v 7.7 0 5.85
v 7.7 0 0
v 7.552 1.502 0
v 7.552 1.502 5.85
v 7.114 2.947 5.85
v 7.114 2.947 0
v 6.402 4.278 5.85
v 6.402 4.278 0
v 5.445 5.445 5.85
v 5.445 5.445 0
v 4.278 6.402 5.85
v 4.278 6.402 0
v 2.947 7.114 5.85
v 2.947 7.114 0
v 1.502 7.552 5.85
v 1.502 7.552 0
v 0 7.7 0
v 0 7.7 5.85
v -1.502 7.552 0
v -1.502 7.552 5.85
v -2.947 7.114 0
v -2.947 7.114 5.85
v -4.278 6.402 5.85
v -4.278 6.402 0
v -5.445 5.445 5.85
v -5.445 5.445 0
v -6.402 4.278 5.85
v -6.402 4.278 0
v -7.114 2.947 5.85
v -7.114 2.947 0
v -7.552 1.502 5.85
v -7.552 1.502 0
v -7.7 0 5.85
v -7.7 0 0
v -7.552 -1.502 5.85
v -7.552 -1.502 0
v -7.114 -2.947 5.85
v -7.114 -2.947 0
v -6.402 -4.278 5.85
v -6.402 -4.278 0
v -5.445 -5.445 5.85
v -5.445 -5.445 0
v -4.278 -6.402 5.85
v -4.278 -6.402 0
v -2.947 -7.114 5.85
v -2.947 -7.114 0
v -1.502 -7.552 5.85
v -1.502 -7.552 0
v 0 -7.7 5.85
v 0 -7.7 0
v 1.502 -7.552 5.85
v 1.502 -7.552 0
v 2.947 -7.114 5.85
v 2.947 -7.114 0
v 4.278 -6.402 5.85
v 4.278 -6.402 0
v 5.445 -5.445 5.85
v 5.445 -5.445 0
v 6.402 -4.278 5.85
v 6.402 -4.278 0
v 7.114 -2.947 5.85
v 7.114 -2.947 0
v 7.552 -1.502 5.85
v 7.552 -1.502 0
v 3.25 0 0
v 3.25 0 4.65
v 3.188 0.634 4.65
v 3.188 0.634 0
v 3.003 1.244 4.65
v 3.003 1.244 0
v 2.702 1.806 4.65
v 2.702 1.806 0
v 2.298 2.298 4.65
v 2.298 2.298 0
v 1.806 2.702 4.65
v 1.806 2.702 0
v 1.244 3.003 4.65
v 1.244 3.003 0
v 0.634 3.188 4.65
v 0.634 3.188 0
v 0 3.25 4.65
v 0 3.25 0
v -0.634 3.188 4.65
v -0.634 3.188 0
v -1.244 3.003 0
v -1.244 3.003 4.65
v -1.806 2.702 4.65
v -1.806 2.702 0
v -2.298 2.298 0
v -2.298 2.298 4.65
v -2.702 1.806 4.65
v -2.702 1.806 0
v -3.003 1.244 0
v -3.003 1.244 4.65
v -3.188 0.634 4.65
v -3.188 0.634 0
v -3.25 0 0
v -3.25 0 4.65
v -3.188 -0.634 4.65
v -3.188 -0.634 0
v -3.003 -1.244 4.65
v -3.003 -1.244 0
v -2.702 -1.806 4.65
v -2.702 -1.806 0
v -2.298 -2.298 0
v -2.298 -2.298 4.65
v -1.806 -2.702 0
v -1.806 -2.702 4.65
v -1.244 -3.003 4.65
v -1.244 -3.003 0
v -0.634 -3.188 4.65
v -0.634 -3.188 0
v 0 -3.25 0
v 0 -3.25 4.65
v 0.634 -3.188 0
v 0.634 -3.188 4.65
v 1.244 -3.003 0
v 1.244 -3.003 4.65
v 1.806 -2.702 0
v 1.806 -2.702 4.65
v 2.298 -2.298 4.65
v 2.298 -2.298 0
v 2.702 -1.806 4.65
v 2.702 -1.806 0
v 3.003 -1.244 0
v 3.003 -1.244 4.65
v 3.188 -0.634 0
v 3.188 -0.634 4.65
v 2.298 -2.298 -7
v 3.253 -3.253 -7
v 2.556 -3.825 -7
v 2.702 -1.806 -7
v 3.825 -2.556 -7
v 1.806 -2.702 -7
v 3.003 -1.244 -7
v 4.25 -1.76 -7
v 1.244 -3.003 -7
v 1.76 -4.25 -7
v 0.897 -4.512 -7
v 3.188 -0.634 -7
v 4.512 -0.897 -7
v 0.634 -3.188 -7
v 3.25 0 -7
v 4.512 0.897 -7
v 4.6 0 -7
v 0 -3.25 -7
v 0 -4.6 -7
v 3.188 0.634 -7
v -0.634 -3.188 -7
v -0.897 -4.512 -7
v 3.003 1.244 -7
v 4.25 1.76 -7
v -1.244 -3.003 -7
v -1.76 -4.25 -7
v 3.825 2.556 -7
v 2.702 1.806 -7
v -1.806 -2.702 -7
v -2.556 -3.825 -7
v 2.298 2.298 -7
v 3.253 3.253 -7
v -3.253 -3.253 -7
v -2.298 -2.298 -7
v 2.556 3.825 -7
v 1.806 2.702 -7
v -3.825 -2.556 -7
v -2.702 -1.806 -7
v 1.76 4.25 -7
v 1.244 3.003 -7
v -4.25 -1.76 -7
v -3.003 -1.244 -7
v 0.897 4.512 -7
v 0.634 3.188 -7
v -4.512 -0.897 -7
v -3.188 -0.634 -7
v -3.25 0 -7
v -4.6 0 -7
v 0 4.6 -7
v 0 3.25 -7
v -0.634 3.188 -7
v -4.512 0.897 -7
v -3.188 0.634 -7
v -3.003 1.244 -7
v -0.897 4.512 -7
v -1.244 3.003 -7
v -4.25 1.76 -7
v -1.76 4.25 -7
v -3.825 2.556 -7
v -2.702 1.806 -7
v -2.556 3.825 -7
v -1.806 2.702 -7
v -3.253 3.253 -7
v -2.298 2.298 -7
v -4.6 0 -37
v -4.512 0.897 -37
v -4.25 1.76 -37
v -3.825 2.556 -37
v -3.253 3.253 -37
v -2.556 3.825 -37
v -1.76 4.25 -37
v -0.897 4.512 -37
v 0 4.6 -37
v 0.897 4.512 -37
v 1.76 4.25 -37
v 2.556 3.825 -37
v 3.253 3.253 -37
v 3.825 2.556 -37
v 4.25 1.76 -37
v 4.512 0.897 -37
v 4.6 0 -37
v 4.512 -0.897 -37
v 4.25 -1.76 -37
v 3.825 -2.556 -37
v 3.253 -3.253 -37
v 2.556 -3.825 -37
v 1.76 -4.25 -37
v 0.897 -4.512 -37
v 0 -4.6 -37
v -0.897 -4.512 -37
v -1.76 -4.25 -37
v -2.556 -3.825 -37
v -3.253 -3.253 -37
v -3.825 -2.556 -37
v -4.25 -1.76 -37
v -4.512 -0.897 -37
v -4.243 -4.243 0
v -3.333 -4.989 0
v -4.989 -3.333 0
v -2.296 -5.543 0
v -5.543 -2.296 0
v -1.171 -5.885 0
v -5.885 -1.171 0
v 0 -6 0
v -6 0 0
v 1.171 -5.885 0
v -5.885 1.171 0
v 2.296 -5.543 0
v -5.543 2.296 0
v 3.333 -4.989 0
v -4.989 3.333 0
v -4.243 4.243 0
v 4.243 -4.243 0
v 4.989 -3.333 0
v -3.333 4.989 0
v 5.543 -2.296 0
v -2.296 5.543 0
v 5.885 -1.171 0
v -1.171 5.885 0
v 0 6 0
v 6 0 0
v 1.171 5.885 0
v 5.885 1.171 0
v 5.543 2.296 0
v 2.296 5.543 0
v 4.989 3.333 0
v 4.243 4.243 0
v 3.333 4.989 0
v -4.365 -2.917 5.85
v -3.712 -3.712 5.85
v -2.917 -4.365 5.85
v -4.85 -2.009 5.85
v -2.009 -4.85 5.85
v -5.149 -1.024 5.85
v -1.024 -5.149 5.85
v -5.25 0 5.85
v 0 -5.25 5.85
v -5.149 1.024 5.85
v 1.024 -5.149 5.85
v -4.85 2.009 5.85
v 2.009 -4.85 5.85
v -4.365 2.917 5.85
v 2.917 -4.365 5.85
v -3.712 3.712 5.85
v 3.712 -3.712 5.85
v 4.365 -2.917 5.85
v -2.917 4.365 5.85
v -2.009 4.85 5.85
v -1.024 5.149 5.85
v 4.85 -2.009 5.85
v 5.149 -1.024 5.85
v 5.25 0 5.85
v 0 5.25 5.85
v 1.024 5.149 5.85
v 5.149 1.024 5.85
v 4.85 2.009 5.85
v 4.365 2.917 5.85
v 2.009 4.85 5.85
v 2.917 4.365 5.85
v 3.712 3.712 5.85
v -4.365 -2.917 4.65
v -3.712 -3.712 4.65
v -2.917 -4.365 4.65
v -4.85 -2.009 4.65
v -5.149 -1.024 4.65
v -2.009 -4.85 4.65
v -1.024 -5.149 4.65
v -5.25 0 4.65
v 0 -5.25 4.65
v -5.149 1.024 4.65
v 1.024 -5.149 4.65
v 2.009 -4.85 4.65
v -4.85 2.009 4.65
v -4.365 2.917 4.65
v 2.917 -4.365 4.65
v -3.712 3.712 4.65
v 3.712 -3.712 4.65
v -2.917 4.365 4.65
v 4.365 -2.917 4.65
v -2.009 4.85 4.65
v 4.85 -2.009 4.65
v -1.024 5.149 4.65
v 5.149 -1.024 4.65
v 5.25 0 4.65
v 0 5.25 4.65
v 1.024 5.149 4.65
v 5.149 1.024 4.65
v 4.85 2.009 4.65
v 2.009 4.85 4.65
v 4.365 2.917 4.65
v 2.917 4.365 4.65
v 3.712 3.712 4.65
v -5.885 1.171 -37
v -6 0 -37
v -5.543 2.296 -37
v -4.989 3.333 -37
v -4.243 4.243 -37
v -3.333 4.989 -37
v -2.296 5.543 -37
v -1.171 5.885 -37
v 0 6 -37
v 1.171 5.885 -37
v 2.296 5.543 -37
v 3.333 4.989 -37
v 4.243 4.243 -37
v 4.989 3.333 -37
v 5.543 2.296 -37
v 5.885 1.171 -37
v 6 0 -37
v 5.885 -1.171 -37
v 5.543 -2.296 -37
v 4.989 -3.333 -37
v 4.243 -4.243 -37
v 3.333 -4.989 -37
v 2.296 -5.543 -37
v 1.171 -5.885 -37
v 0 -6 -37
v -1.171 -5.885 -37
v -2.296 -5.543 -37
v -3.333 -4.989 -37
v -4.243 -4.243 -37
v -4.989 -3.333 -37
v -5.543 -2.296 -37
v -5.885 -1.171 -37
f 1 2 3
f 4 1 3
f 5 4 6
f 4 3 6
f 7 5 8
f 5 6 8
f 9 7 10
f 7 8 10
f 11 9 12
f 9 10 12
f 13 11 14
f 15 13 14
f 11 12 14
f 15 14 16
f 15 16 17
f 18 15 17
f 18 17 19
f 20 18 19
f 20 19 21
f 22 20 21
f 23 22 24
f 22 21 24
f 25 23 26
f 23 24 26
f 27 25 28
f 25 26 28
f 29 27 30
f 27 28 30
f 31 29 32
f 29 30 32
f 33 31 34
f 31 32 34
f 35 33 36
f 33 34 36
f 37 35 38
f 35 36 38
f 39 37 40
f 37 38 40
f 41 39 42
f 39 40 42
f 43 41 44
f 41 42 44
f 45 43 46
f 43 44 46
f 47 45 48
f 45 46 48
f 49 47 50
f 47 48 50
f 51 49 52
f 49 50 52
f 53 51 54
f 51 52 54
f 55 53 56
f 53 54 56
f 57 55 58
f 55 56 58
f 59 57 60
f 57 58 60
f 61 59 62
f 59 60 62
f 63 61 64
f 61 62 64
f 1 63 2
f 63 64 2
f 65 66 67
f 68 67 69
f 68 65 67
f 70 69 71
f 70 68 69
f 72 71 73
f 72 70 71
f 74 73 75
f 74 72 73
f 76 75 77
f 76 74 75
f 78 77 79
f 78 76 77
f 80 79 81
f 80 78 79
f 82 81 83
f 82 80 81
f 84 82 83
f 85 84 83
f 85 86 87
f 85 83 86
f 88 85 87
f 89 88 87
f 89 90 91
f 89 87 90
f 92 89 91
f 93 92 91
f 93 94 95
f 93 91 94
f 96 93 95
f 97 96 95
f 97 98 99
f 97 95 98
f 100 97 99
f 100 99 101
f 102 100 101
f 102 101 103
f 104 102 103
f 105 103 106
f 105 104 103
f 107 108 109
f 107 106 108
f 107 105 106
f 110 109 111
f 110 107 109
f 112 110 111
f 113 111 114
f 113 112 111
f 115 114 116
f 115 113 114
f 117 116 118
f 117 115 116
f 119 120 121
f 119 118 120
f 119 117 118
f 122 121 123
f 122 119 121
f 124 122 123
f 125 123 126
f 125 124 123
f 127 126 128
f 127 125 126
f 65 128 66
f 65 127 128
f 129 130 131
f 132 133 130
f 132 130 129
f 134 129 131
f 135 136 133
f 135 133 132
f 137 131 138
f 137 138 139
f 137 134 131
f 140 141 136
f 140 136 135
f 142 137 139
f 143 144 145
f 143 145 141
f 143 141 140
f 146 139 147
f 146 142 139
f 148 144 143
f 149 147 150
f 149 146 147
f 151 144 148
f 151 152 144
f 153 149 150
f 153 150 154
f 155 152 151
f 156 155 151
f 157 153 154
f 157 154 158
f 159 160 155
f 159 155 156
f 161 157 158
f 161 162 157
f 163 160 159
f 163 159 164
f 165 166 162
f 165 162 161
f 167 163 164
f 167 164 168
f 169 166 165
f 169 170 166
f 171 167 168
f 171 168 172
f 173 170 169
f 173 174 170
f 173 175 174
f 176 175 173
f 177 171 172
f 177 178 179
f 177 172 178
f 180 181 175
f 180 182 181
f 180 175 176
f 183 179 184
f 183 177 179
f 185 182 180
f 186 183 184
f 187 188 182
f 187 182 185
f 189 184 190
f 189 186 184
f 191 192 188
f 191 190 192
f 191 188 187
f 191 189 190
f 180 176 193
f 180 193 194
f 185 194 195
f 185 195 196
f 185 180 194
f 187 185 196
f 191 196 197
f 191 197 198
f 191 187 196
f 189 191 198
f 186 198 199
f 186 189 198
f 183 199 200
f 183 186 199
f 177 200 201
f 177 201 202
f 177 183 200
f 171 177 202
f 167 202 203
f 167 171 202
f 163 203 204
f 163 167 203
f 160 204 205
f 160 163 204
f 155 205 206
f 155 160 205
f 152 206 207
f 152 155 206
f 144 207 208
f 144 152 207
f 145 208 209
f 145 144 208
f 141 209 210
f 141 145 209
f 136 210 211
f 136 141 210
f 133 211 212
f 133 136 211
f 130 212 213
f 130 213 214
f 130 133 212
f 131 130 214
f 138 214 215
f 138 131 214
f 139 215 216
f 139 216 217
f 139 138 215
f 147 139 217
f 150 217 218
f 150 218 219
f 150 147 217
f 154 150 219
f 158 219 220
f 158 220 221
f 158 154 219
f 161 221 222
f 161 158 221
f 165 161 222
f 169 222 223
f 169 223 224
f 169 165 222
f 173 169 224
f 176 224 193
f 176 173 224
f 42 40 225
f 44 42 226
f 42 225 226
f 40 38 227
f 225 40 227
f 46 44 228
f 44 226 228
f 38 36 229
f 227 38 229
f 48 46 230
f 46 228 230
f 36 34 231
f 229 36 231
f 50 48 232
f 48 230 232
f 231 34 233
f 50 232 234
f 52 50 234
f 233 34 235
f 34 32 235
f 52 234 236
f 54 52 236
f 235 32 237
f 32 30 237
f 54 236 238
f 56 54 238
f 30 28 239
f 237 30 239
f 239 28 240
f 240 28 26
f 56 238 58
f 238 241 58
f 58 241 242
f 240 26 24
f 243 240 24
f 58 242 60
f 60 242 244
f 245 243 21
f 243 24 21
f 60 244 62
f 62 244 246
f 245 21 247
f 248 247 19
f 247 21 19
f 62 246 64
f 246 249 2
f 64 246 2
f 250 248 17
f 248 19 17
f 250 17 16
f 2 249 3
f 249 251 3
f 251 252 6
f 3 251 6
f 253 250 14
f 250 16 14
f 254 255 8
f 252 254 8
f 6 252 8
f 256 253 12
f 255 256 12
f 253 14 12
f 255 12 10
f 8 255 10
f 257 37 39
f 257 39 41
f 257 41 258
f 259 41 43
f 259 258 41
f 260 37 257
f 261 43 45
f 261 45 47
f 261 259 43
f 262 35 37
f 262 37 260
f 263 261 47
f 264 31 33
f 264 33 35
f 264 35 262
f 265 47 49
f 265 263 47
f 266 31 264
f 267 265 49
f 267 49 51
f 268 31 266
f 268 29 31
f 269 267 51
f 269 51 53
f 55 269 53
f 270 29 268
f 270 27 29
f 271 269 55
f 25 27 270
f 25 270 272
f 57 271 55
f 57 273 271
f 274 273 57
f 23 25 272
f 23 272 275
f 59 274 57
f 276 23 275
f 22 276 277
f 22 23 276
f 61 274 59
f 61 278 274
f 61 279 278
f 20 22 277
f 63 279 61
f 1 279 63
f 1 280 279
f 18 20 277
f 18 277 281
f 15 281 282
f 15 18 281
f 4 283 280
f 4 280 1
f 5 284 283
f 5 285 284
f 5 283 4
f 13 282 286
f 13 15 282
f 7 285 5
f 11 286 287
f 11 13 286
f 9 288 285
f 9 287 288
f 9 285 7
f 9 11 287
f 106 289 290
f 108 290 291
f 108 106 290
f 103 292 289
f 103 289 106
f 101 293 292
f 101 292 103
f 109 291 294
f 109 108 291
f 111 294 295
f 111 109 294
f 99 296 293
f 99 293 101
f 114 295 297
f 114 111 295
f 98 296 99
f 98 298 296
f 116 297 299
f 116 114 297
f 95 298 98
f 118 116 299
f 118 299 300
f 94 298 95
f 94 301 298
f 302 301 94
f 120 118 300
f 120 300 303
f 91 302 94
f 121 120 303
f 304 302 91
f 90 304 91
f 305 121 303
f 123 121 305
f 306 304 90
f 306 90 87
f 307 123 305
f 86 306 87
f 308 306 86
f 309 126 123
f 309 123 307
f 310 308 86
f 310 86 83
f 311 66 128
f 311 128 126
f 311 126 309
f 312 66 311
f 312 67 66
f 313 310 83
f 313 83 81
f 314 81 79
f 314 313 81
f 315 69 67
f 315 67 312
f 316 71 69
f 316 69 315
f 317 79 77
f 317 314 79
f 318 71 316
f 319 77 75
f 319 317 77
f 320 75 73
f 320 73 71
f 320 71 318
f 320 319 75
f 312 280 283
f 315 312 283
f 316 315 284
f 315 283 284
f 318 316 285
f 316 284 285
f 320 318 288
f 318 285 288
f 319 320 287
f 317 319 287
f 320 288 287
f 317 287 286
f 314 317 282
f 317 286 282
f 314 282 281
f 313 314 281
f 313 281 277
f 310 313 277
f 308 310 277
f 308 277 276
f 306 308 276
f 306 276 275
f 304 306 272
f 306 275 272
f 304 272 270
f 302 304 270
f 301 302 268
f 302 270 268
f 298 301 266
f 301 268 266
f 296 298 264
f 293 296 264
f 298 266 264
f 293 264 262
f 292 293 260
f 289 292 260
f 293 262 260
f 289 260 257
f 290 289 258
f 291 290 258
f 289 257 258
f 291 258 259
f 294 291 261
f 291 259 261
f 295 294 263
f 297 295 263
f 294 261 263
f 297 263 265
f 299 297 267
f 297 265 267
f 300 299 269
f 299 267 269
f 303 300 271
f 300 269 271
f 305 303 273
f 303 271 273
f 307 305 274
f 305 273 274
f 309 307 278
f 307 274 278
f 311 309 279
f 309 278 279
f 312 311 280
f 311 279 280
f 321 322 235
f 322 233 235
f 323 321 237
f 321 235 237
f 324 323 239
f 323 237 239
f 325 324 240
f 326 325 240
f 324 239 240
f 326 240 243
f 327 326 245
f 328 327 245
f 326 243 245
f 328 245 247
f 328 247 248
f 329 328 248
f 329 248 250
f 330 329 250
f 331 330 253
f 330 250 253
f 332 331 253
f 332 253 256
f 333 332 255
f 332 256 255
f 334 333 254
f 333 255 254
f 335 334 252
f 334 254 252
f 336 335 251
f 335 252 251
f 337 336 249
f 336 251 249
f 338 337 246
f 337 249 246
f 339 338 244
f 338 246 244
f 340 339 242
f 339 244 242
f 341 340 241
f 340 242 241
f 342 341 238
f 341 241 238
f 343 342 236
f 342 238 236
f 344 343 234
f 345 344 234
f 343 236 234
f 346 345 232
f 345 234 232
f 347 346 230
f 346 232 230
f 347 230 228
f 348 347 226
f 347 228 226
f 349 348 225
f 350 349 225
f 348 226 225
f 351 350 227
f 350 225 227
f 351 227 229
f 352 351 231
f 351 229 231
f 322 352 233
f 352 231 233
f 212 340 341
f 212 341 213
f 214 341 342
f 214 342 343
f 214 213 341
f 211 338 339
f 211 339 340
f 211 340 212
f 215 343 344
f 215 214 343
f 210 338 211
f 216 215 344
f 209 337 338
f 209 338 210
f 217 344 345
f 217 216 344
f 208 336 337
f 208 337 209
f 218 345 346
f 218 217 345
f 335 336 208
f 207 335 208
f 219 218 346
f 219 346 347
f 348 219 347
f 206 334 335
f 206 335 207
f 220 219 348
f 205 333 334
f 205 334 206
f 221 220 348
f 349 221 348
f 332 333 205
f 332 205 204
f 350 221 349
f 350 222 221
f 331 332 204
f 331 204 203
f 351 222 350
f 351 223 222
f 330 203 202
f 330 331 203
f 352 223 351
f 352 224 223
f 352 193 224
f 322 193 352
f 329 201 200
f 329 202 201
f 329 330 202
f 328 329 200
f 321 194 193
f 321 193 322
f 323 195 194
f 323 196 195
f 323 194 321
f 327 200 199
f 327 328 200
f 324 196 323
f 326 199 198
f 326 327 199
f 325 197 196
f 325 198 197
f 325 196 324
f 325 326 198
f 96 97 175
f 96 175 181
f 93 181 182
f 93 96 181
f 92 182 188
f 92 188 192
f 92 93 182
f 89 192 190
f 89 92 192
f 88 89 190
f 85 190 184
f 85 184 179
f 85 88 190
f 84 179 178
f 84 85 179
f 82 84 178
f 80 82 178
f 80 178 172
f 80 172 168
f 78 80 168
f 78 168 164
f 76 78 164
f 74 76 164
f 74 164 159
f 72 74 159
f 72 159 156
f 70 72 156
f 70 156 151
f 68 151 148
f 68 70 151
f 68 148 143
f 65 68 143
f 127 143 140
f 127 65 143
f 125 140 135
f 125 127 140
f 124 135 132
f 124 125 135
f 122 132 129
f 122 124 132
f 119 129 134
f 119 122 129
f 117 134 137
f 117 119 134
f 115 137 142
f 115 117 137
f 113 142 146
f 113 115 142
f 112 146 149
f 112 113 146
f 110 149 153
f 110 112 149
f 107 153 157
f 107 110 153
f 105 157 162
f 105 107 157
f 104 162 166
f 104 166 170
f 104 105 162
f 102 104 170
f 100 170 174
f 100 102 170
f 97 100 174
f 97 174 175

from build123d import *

# Parameters (mm, degrees)
SKETCH1_R           = 7.7
SKETCH1_R_2         = 3.25
BOSS_EXTRUDE1_DEPTH = 5.85
SKETCH2_R           = 5.25
CUT_EXTRUDE1_DEPTH  = 1.2
SKETCH4_R           = 6
SKETCH4_R_2         = 3.25
BOSS_EXTRUDE2_DEPTH = 7
SKETCH5_R           = 6
SKETCH5_R_2         = 4.6
BOSS_EXTRUDE5_DEPTH = 30


with BuildPart() as part:
    # Sketch1 → Boss-Extrude1 (new body)
    with BuildSketch(Plane.XY):
        Circle(SKETCH1_R)
        Circle(SKETCH1_R_2, mode=Mode.SUBTRACT)
    extrude(amount=BOSS_EXTRUDE1_DEPTH)

    # Sketch2 → Cut-Extrude1 (cut)
    with BuildSketch(Plane.XY.offset(5.85)):
        Circle(SKETCH2_R)
    extrude(amount=-CUT_EXTRUDE1_DEPTH, mode=Mode.SUBTRACT)

    # Sketch4 → Boss-Extrude2 (add)
    with BuildSketch(Plane(origin=(0, 0, 0), x_dir=(-1, 0, 0), z_dir=(0, 0, -1))):
        Circle(SKETCH4_R)
        Circle(SKETCH4_R_2, mode=Mode.SUBTRACT)
    extrude(amount=BOSS_EXTRUDE2_DEPTH)

    # Sketch5 → Boss-Extrude5 (add)
    with BuildSketch(Plane(origin=(0, 0, -7), x_dir=(-1, 0, 0), z_dir=(0, 0, -1))):
        Circle(SKETCH5_R)
        Circle(SKETCH5_R_2, mode=Mode.SUBTRACT)
    extrude(amount=BOSS_EXTRUDE5_DEPTH)


solid = part.part
